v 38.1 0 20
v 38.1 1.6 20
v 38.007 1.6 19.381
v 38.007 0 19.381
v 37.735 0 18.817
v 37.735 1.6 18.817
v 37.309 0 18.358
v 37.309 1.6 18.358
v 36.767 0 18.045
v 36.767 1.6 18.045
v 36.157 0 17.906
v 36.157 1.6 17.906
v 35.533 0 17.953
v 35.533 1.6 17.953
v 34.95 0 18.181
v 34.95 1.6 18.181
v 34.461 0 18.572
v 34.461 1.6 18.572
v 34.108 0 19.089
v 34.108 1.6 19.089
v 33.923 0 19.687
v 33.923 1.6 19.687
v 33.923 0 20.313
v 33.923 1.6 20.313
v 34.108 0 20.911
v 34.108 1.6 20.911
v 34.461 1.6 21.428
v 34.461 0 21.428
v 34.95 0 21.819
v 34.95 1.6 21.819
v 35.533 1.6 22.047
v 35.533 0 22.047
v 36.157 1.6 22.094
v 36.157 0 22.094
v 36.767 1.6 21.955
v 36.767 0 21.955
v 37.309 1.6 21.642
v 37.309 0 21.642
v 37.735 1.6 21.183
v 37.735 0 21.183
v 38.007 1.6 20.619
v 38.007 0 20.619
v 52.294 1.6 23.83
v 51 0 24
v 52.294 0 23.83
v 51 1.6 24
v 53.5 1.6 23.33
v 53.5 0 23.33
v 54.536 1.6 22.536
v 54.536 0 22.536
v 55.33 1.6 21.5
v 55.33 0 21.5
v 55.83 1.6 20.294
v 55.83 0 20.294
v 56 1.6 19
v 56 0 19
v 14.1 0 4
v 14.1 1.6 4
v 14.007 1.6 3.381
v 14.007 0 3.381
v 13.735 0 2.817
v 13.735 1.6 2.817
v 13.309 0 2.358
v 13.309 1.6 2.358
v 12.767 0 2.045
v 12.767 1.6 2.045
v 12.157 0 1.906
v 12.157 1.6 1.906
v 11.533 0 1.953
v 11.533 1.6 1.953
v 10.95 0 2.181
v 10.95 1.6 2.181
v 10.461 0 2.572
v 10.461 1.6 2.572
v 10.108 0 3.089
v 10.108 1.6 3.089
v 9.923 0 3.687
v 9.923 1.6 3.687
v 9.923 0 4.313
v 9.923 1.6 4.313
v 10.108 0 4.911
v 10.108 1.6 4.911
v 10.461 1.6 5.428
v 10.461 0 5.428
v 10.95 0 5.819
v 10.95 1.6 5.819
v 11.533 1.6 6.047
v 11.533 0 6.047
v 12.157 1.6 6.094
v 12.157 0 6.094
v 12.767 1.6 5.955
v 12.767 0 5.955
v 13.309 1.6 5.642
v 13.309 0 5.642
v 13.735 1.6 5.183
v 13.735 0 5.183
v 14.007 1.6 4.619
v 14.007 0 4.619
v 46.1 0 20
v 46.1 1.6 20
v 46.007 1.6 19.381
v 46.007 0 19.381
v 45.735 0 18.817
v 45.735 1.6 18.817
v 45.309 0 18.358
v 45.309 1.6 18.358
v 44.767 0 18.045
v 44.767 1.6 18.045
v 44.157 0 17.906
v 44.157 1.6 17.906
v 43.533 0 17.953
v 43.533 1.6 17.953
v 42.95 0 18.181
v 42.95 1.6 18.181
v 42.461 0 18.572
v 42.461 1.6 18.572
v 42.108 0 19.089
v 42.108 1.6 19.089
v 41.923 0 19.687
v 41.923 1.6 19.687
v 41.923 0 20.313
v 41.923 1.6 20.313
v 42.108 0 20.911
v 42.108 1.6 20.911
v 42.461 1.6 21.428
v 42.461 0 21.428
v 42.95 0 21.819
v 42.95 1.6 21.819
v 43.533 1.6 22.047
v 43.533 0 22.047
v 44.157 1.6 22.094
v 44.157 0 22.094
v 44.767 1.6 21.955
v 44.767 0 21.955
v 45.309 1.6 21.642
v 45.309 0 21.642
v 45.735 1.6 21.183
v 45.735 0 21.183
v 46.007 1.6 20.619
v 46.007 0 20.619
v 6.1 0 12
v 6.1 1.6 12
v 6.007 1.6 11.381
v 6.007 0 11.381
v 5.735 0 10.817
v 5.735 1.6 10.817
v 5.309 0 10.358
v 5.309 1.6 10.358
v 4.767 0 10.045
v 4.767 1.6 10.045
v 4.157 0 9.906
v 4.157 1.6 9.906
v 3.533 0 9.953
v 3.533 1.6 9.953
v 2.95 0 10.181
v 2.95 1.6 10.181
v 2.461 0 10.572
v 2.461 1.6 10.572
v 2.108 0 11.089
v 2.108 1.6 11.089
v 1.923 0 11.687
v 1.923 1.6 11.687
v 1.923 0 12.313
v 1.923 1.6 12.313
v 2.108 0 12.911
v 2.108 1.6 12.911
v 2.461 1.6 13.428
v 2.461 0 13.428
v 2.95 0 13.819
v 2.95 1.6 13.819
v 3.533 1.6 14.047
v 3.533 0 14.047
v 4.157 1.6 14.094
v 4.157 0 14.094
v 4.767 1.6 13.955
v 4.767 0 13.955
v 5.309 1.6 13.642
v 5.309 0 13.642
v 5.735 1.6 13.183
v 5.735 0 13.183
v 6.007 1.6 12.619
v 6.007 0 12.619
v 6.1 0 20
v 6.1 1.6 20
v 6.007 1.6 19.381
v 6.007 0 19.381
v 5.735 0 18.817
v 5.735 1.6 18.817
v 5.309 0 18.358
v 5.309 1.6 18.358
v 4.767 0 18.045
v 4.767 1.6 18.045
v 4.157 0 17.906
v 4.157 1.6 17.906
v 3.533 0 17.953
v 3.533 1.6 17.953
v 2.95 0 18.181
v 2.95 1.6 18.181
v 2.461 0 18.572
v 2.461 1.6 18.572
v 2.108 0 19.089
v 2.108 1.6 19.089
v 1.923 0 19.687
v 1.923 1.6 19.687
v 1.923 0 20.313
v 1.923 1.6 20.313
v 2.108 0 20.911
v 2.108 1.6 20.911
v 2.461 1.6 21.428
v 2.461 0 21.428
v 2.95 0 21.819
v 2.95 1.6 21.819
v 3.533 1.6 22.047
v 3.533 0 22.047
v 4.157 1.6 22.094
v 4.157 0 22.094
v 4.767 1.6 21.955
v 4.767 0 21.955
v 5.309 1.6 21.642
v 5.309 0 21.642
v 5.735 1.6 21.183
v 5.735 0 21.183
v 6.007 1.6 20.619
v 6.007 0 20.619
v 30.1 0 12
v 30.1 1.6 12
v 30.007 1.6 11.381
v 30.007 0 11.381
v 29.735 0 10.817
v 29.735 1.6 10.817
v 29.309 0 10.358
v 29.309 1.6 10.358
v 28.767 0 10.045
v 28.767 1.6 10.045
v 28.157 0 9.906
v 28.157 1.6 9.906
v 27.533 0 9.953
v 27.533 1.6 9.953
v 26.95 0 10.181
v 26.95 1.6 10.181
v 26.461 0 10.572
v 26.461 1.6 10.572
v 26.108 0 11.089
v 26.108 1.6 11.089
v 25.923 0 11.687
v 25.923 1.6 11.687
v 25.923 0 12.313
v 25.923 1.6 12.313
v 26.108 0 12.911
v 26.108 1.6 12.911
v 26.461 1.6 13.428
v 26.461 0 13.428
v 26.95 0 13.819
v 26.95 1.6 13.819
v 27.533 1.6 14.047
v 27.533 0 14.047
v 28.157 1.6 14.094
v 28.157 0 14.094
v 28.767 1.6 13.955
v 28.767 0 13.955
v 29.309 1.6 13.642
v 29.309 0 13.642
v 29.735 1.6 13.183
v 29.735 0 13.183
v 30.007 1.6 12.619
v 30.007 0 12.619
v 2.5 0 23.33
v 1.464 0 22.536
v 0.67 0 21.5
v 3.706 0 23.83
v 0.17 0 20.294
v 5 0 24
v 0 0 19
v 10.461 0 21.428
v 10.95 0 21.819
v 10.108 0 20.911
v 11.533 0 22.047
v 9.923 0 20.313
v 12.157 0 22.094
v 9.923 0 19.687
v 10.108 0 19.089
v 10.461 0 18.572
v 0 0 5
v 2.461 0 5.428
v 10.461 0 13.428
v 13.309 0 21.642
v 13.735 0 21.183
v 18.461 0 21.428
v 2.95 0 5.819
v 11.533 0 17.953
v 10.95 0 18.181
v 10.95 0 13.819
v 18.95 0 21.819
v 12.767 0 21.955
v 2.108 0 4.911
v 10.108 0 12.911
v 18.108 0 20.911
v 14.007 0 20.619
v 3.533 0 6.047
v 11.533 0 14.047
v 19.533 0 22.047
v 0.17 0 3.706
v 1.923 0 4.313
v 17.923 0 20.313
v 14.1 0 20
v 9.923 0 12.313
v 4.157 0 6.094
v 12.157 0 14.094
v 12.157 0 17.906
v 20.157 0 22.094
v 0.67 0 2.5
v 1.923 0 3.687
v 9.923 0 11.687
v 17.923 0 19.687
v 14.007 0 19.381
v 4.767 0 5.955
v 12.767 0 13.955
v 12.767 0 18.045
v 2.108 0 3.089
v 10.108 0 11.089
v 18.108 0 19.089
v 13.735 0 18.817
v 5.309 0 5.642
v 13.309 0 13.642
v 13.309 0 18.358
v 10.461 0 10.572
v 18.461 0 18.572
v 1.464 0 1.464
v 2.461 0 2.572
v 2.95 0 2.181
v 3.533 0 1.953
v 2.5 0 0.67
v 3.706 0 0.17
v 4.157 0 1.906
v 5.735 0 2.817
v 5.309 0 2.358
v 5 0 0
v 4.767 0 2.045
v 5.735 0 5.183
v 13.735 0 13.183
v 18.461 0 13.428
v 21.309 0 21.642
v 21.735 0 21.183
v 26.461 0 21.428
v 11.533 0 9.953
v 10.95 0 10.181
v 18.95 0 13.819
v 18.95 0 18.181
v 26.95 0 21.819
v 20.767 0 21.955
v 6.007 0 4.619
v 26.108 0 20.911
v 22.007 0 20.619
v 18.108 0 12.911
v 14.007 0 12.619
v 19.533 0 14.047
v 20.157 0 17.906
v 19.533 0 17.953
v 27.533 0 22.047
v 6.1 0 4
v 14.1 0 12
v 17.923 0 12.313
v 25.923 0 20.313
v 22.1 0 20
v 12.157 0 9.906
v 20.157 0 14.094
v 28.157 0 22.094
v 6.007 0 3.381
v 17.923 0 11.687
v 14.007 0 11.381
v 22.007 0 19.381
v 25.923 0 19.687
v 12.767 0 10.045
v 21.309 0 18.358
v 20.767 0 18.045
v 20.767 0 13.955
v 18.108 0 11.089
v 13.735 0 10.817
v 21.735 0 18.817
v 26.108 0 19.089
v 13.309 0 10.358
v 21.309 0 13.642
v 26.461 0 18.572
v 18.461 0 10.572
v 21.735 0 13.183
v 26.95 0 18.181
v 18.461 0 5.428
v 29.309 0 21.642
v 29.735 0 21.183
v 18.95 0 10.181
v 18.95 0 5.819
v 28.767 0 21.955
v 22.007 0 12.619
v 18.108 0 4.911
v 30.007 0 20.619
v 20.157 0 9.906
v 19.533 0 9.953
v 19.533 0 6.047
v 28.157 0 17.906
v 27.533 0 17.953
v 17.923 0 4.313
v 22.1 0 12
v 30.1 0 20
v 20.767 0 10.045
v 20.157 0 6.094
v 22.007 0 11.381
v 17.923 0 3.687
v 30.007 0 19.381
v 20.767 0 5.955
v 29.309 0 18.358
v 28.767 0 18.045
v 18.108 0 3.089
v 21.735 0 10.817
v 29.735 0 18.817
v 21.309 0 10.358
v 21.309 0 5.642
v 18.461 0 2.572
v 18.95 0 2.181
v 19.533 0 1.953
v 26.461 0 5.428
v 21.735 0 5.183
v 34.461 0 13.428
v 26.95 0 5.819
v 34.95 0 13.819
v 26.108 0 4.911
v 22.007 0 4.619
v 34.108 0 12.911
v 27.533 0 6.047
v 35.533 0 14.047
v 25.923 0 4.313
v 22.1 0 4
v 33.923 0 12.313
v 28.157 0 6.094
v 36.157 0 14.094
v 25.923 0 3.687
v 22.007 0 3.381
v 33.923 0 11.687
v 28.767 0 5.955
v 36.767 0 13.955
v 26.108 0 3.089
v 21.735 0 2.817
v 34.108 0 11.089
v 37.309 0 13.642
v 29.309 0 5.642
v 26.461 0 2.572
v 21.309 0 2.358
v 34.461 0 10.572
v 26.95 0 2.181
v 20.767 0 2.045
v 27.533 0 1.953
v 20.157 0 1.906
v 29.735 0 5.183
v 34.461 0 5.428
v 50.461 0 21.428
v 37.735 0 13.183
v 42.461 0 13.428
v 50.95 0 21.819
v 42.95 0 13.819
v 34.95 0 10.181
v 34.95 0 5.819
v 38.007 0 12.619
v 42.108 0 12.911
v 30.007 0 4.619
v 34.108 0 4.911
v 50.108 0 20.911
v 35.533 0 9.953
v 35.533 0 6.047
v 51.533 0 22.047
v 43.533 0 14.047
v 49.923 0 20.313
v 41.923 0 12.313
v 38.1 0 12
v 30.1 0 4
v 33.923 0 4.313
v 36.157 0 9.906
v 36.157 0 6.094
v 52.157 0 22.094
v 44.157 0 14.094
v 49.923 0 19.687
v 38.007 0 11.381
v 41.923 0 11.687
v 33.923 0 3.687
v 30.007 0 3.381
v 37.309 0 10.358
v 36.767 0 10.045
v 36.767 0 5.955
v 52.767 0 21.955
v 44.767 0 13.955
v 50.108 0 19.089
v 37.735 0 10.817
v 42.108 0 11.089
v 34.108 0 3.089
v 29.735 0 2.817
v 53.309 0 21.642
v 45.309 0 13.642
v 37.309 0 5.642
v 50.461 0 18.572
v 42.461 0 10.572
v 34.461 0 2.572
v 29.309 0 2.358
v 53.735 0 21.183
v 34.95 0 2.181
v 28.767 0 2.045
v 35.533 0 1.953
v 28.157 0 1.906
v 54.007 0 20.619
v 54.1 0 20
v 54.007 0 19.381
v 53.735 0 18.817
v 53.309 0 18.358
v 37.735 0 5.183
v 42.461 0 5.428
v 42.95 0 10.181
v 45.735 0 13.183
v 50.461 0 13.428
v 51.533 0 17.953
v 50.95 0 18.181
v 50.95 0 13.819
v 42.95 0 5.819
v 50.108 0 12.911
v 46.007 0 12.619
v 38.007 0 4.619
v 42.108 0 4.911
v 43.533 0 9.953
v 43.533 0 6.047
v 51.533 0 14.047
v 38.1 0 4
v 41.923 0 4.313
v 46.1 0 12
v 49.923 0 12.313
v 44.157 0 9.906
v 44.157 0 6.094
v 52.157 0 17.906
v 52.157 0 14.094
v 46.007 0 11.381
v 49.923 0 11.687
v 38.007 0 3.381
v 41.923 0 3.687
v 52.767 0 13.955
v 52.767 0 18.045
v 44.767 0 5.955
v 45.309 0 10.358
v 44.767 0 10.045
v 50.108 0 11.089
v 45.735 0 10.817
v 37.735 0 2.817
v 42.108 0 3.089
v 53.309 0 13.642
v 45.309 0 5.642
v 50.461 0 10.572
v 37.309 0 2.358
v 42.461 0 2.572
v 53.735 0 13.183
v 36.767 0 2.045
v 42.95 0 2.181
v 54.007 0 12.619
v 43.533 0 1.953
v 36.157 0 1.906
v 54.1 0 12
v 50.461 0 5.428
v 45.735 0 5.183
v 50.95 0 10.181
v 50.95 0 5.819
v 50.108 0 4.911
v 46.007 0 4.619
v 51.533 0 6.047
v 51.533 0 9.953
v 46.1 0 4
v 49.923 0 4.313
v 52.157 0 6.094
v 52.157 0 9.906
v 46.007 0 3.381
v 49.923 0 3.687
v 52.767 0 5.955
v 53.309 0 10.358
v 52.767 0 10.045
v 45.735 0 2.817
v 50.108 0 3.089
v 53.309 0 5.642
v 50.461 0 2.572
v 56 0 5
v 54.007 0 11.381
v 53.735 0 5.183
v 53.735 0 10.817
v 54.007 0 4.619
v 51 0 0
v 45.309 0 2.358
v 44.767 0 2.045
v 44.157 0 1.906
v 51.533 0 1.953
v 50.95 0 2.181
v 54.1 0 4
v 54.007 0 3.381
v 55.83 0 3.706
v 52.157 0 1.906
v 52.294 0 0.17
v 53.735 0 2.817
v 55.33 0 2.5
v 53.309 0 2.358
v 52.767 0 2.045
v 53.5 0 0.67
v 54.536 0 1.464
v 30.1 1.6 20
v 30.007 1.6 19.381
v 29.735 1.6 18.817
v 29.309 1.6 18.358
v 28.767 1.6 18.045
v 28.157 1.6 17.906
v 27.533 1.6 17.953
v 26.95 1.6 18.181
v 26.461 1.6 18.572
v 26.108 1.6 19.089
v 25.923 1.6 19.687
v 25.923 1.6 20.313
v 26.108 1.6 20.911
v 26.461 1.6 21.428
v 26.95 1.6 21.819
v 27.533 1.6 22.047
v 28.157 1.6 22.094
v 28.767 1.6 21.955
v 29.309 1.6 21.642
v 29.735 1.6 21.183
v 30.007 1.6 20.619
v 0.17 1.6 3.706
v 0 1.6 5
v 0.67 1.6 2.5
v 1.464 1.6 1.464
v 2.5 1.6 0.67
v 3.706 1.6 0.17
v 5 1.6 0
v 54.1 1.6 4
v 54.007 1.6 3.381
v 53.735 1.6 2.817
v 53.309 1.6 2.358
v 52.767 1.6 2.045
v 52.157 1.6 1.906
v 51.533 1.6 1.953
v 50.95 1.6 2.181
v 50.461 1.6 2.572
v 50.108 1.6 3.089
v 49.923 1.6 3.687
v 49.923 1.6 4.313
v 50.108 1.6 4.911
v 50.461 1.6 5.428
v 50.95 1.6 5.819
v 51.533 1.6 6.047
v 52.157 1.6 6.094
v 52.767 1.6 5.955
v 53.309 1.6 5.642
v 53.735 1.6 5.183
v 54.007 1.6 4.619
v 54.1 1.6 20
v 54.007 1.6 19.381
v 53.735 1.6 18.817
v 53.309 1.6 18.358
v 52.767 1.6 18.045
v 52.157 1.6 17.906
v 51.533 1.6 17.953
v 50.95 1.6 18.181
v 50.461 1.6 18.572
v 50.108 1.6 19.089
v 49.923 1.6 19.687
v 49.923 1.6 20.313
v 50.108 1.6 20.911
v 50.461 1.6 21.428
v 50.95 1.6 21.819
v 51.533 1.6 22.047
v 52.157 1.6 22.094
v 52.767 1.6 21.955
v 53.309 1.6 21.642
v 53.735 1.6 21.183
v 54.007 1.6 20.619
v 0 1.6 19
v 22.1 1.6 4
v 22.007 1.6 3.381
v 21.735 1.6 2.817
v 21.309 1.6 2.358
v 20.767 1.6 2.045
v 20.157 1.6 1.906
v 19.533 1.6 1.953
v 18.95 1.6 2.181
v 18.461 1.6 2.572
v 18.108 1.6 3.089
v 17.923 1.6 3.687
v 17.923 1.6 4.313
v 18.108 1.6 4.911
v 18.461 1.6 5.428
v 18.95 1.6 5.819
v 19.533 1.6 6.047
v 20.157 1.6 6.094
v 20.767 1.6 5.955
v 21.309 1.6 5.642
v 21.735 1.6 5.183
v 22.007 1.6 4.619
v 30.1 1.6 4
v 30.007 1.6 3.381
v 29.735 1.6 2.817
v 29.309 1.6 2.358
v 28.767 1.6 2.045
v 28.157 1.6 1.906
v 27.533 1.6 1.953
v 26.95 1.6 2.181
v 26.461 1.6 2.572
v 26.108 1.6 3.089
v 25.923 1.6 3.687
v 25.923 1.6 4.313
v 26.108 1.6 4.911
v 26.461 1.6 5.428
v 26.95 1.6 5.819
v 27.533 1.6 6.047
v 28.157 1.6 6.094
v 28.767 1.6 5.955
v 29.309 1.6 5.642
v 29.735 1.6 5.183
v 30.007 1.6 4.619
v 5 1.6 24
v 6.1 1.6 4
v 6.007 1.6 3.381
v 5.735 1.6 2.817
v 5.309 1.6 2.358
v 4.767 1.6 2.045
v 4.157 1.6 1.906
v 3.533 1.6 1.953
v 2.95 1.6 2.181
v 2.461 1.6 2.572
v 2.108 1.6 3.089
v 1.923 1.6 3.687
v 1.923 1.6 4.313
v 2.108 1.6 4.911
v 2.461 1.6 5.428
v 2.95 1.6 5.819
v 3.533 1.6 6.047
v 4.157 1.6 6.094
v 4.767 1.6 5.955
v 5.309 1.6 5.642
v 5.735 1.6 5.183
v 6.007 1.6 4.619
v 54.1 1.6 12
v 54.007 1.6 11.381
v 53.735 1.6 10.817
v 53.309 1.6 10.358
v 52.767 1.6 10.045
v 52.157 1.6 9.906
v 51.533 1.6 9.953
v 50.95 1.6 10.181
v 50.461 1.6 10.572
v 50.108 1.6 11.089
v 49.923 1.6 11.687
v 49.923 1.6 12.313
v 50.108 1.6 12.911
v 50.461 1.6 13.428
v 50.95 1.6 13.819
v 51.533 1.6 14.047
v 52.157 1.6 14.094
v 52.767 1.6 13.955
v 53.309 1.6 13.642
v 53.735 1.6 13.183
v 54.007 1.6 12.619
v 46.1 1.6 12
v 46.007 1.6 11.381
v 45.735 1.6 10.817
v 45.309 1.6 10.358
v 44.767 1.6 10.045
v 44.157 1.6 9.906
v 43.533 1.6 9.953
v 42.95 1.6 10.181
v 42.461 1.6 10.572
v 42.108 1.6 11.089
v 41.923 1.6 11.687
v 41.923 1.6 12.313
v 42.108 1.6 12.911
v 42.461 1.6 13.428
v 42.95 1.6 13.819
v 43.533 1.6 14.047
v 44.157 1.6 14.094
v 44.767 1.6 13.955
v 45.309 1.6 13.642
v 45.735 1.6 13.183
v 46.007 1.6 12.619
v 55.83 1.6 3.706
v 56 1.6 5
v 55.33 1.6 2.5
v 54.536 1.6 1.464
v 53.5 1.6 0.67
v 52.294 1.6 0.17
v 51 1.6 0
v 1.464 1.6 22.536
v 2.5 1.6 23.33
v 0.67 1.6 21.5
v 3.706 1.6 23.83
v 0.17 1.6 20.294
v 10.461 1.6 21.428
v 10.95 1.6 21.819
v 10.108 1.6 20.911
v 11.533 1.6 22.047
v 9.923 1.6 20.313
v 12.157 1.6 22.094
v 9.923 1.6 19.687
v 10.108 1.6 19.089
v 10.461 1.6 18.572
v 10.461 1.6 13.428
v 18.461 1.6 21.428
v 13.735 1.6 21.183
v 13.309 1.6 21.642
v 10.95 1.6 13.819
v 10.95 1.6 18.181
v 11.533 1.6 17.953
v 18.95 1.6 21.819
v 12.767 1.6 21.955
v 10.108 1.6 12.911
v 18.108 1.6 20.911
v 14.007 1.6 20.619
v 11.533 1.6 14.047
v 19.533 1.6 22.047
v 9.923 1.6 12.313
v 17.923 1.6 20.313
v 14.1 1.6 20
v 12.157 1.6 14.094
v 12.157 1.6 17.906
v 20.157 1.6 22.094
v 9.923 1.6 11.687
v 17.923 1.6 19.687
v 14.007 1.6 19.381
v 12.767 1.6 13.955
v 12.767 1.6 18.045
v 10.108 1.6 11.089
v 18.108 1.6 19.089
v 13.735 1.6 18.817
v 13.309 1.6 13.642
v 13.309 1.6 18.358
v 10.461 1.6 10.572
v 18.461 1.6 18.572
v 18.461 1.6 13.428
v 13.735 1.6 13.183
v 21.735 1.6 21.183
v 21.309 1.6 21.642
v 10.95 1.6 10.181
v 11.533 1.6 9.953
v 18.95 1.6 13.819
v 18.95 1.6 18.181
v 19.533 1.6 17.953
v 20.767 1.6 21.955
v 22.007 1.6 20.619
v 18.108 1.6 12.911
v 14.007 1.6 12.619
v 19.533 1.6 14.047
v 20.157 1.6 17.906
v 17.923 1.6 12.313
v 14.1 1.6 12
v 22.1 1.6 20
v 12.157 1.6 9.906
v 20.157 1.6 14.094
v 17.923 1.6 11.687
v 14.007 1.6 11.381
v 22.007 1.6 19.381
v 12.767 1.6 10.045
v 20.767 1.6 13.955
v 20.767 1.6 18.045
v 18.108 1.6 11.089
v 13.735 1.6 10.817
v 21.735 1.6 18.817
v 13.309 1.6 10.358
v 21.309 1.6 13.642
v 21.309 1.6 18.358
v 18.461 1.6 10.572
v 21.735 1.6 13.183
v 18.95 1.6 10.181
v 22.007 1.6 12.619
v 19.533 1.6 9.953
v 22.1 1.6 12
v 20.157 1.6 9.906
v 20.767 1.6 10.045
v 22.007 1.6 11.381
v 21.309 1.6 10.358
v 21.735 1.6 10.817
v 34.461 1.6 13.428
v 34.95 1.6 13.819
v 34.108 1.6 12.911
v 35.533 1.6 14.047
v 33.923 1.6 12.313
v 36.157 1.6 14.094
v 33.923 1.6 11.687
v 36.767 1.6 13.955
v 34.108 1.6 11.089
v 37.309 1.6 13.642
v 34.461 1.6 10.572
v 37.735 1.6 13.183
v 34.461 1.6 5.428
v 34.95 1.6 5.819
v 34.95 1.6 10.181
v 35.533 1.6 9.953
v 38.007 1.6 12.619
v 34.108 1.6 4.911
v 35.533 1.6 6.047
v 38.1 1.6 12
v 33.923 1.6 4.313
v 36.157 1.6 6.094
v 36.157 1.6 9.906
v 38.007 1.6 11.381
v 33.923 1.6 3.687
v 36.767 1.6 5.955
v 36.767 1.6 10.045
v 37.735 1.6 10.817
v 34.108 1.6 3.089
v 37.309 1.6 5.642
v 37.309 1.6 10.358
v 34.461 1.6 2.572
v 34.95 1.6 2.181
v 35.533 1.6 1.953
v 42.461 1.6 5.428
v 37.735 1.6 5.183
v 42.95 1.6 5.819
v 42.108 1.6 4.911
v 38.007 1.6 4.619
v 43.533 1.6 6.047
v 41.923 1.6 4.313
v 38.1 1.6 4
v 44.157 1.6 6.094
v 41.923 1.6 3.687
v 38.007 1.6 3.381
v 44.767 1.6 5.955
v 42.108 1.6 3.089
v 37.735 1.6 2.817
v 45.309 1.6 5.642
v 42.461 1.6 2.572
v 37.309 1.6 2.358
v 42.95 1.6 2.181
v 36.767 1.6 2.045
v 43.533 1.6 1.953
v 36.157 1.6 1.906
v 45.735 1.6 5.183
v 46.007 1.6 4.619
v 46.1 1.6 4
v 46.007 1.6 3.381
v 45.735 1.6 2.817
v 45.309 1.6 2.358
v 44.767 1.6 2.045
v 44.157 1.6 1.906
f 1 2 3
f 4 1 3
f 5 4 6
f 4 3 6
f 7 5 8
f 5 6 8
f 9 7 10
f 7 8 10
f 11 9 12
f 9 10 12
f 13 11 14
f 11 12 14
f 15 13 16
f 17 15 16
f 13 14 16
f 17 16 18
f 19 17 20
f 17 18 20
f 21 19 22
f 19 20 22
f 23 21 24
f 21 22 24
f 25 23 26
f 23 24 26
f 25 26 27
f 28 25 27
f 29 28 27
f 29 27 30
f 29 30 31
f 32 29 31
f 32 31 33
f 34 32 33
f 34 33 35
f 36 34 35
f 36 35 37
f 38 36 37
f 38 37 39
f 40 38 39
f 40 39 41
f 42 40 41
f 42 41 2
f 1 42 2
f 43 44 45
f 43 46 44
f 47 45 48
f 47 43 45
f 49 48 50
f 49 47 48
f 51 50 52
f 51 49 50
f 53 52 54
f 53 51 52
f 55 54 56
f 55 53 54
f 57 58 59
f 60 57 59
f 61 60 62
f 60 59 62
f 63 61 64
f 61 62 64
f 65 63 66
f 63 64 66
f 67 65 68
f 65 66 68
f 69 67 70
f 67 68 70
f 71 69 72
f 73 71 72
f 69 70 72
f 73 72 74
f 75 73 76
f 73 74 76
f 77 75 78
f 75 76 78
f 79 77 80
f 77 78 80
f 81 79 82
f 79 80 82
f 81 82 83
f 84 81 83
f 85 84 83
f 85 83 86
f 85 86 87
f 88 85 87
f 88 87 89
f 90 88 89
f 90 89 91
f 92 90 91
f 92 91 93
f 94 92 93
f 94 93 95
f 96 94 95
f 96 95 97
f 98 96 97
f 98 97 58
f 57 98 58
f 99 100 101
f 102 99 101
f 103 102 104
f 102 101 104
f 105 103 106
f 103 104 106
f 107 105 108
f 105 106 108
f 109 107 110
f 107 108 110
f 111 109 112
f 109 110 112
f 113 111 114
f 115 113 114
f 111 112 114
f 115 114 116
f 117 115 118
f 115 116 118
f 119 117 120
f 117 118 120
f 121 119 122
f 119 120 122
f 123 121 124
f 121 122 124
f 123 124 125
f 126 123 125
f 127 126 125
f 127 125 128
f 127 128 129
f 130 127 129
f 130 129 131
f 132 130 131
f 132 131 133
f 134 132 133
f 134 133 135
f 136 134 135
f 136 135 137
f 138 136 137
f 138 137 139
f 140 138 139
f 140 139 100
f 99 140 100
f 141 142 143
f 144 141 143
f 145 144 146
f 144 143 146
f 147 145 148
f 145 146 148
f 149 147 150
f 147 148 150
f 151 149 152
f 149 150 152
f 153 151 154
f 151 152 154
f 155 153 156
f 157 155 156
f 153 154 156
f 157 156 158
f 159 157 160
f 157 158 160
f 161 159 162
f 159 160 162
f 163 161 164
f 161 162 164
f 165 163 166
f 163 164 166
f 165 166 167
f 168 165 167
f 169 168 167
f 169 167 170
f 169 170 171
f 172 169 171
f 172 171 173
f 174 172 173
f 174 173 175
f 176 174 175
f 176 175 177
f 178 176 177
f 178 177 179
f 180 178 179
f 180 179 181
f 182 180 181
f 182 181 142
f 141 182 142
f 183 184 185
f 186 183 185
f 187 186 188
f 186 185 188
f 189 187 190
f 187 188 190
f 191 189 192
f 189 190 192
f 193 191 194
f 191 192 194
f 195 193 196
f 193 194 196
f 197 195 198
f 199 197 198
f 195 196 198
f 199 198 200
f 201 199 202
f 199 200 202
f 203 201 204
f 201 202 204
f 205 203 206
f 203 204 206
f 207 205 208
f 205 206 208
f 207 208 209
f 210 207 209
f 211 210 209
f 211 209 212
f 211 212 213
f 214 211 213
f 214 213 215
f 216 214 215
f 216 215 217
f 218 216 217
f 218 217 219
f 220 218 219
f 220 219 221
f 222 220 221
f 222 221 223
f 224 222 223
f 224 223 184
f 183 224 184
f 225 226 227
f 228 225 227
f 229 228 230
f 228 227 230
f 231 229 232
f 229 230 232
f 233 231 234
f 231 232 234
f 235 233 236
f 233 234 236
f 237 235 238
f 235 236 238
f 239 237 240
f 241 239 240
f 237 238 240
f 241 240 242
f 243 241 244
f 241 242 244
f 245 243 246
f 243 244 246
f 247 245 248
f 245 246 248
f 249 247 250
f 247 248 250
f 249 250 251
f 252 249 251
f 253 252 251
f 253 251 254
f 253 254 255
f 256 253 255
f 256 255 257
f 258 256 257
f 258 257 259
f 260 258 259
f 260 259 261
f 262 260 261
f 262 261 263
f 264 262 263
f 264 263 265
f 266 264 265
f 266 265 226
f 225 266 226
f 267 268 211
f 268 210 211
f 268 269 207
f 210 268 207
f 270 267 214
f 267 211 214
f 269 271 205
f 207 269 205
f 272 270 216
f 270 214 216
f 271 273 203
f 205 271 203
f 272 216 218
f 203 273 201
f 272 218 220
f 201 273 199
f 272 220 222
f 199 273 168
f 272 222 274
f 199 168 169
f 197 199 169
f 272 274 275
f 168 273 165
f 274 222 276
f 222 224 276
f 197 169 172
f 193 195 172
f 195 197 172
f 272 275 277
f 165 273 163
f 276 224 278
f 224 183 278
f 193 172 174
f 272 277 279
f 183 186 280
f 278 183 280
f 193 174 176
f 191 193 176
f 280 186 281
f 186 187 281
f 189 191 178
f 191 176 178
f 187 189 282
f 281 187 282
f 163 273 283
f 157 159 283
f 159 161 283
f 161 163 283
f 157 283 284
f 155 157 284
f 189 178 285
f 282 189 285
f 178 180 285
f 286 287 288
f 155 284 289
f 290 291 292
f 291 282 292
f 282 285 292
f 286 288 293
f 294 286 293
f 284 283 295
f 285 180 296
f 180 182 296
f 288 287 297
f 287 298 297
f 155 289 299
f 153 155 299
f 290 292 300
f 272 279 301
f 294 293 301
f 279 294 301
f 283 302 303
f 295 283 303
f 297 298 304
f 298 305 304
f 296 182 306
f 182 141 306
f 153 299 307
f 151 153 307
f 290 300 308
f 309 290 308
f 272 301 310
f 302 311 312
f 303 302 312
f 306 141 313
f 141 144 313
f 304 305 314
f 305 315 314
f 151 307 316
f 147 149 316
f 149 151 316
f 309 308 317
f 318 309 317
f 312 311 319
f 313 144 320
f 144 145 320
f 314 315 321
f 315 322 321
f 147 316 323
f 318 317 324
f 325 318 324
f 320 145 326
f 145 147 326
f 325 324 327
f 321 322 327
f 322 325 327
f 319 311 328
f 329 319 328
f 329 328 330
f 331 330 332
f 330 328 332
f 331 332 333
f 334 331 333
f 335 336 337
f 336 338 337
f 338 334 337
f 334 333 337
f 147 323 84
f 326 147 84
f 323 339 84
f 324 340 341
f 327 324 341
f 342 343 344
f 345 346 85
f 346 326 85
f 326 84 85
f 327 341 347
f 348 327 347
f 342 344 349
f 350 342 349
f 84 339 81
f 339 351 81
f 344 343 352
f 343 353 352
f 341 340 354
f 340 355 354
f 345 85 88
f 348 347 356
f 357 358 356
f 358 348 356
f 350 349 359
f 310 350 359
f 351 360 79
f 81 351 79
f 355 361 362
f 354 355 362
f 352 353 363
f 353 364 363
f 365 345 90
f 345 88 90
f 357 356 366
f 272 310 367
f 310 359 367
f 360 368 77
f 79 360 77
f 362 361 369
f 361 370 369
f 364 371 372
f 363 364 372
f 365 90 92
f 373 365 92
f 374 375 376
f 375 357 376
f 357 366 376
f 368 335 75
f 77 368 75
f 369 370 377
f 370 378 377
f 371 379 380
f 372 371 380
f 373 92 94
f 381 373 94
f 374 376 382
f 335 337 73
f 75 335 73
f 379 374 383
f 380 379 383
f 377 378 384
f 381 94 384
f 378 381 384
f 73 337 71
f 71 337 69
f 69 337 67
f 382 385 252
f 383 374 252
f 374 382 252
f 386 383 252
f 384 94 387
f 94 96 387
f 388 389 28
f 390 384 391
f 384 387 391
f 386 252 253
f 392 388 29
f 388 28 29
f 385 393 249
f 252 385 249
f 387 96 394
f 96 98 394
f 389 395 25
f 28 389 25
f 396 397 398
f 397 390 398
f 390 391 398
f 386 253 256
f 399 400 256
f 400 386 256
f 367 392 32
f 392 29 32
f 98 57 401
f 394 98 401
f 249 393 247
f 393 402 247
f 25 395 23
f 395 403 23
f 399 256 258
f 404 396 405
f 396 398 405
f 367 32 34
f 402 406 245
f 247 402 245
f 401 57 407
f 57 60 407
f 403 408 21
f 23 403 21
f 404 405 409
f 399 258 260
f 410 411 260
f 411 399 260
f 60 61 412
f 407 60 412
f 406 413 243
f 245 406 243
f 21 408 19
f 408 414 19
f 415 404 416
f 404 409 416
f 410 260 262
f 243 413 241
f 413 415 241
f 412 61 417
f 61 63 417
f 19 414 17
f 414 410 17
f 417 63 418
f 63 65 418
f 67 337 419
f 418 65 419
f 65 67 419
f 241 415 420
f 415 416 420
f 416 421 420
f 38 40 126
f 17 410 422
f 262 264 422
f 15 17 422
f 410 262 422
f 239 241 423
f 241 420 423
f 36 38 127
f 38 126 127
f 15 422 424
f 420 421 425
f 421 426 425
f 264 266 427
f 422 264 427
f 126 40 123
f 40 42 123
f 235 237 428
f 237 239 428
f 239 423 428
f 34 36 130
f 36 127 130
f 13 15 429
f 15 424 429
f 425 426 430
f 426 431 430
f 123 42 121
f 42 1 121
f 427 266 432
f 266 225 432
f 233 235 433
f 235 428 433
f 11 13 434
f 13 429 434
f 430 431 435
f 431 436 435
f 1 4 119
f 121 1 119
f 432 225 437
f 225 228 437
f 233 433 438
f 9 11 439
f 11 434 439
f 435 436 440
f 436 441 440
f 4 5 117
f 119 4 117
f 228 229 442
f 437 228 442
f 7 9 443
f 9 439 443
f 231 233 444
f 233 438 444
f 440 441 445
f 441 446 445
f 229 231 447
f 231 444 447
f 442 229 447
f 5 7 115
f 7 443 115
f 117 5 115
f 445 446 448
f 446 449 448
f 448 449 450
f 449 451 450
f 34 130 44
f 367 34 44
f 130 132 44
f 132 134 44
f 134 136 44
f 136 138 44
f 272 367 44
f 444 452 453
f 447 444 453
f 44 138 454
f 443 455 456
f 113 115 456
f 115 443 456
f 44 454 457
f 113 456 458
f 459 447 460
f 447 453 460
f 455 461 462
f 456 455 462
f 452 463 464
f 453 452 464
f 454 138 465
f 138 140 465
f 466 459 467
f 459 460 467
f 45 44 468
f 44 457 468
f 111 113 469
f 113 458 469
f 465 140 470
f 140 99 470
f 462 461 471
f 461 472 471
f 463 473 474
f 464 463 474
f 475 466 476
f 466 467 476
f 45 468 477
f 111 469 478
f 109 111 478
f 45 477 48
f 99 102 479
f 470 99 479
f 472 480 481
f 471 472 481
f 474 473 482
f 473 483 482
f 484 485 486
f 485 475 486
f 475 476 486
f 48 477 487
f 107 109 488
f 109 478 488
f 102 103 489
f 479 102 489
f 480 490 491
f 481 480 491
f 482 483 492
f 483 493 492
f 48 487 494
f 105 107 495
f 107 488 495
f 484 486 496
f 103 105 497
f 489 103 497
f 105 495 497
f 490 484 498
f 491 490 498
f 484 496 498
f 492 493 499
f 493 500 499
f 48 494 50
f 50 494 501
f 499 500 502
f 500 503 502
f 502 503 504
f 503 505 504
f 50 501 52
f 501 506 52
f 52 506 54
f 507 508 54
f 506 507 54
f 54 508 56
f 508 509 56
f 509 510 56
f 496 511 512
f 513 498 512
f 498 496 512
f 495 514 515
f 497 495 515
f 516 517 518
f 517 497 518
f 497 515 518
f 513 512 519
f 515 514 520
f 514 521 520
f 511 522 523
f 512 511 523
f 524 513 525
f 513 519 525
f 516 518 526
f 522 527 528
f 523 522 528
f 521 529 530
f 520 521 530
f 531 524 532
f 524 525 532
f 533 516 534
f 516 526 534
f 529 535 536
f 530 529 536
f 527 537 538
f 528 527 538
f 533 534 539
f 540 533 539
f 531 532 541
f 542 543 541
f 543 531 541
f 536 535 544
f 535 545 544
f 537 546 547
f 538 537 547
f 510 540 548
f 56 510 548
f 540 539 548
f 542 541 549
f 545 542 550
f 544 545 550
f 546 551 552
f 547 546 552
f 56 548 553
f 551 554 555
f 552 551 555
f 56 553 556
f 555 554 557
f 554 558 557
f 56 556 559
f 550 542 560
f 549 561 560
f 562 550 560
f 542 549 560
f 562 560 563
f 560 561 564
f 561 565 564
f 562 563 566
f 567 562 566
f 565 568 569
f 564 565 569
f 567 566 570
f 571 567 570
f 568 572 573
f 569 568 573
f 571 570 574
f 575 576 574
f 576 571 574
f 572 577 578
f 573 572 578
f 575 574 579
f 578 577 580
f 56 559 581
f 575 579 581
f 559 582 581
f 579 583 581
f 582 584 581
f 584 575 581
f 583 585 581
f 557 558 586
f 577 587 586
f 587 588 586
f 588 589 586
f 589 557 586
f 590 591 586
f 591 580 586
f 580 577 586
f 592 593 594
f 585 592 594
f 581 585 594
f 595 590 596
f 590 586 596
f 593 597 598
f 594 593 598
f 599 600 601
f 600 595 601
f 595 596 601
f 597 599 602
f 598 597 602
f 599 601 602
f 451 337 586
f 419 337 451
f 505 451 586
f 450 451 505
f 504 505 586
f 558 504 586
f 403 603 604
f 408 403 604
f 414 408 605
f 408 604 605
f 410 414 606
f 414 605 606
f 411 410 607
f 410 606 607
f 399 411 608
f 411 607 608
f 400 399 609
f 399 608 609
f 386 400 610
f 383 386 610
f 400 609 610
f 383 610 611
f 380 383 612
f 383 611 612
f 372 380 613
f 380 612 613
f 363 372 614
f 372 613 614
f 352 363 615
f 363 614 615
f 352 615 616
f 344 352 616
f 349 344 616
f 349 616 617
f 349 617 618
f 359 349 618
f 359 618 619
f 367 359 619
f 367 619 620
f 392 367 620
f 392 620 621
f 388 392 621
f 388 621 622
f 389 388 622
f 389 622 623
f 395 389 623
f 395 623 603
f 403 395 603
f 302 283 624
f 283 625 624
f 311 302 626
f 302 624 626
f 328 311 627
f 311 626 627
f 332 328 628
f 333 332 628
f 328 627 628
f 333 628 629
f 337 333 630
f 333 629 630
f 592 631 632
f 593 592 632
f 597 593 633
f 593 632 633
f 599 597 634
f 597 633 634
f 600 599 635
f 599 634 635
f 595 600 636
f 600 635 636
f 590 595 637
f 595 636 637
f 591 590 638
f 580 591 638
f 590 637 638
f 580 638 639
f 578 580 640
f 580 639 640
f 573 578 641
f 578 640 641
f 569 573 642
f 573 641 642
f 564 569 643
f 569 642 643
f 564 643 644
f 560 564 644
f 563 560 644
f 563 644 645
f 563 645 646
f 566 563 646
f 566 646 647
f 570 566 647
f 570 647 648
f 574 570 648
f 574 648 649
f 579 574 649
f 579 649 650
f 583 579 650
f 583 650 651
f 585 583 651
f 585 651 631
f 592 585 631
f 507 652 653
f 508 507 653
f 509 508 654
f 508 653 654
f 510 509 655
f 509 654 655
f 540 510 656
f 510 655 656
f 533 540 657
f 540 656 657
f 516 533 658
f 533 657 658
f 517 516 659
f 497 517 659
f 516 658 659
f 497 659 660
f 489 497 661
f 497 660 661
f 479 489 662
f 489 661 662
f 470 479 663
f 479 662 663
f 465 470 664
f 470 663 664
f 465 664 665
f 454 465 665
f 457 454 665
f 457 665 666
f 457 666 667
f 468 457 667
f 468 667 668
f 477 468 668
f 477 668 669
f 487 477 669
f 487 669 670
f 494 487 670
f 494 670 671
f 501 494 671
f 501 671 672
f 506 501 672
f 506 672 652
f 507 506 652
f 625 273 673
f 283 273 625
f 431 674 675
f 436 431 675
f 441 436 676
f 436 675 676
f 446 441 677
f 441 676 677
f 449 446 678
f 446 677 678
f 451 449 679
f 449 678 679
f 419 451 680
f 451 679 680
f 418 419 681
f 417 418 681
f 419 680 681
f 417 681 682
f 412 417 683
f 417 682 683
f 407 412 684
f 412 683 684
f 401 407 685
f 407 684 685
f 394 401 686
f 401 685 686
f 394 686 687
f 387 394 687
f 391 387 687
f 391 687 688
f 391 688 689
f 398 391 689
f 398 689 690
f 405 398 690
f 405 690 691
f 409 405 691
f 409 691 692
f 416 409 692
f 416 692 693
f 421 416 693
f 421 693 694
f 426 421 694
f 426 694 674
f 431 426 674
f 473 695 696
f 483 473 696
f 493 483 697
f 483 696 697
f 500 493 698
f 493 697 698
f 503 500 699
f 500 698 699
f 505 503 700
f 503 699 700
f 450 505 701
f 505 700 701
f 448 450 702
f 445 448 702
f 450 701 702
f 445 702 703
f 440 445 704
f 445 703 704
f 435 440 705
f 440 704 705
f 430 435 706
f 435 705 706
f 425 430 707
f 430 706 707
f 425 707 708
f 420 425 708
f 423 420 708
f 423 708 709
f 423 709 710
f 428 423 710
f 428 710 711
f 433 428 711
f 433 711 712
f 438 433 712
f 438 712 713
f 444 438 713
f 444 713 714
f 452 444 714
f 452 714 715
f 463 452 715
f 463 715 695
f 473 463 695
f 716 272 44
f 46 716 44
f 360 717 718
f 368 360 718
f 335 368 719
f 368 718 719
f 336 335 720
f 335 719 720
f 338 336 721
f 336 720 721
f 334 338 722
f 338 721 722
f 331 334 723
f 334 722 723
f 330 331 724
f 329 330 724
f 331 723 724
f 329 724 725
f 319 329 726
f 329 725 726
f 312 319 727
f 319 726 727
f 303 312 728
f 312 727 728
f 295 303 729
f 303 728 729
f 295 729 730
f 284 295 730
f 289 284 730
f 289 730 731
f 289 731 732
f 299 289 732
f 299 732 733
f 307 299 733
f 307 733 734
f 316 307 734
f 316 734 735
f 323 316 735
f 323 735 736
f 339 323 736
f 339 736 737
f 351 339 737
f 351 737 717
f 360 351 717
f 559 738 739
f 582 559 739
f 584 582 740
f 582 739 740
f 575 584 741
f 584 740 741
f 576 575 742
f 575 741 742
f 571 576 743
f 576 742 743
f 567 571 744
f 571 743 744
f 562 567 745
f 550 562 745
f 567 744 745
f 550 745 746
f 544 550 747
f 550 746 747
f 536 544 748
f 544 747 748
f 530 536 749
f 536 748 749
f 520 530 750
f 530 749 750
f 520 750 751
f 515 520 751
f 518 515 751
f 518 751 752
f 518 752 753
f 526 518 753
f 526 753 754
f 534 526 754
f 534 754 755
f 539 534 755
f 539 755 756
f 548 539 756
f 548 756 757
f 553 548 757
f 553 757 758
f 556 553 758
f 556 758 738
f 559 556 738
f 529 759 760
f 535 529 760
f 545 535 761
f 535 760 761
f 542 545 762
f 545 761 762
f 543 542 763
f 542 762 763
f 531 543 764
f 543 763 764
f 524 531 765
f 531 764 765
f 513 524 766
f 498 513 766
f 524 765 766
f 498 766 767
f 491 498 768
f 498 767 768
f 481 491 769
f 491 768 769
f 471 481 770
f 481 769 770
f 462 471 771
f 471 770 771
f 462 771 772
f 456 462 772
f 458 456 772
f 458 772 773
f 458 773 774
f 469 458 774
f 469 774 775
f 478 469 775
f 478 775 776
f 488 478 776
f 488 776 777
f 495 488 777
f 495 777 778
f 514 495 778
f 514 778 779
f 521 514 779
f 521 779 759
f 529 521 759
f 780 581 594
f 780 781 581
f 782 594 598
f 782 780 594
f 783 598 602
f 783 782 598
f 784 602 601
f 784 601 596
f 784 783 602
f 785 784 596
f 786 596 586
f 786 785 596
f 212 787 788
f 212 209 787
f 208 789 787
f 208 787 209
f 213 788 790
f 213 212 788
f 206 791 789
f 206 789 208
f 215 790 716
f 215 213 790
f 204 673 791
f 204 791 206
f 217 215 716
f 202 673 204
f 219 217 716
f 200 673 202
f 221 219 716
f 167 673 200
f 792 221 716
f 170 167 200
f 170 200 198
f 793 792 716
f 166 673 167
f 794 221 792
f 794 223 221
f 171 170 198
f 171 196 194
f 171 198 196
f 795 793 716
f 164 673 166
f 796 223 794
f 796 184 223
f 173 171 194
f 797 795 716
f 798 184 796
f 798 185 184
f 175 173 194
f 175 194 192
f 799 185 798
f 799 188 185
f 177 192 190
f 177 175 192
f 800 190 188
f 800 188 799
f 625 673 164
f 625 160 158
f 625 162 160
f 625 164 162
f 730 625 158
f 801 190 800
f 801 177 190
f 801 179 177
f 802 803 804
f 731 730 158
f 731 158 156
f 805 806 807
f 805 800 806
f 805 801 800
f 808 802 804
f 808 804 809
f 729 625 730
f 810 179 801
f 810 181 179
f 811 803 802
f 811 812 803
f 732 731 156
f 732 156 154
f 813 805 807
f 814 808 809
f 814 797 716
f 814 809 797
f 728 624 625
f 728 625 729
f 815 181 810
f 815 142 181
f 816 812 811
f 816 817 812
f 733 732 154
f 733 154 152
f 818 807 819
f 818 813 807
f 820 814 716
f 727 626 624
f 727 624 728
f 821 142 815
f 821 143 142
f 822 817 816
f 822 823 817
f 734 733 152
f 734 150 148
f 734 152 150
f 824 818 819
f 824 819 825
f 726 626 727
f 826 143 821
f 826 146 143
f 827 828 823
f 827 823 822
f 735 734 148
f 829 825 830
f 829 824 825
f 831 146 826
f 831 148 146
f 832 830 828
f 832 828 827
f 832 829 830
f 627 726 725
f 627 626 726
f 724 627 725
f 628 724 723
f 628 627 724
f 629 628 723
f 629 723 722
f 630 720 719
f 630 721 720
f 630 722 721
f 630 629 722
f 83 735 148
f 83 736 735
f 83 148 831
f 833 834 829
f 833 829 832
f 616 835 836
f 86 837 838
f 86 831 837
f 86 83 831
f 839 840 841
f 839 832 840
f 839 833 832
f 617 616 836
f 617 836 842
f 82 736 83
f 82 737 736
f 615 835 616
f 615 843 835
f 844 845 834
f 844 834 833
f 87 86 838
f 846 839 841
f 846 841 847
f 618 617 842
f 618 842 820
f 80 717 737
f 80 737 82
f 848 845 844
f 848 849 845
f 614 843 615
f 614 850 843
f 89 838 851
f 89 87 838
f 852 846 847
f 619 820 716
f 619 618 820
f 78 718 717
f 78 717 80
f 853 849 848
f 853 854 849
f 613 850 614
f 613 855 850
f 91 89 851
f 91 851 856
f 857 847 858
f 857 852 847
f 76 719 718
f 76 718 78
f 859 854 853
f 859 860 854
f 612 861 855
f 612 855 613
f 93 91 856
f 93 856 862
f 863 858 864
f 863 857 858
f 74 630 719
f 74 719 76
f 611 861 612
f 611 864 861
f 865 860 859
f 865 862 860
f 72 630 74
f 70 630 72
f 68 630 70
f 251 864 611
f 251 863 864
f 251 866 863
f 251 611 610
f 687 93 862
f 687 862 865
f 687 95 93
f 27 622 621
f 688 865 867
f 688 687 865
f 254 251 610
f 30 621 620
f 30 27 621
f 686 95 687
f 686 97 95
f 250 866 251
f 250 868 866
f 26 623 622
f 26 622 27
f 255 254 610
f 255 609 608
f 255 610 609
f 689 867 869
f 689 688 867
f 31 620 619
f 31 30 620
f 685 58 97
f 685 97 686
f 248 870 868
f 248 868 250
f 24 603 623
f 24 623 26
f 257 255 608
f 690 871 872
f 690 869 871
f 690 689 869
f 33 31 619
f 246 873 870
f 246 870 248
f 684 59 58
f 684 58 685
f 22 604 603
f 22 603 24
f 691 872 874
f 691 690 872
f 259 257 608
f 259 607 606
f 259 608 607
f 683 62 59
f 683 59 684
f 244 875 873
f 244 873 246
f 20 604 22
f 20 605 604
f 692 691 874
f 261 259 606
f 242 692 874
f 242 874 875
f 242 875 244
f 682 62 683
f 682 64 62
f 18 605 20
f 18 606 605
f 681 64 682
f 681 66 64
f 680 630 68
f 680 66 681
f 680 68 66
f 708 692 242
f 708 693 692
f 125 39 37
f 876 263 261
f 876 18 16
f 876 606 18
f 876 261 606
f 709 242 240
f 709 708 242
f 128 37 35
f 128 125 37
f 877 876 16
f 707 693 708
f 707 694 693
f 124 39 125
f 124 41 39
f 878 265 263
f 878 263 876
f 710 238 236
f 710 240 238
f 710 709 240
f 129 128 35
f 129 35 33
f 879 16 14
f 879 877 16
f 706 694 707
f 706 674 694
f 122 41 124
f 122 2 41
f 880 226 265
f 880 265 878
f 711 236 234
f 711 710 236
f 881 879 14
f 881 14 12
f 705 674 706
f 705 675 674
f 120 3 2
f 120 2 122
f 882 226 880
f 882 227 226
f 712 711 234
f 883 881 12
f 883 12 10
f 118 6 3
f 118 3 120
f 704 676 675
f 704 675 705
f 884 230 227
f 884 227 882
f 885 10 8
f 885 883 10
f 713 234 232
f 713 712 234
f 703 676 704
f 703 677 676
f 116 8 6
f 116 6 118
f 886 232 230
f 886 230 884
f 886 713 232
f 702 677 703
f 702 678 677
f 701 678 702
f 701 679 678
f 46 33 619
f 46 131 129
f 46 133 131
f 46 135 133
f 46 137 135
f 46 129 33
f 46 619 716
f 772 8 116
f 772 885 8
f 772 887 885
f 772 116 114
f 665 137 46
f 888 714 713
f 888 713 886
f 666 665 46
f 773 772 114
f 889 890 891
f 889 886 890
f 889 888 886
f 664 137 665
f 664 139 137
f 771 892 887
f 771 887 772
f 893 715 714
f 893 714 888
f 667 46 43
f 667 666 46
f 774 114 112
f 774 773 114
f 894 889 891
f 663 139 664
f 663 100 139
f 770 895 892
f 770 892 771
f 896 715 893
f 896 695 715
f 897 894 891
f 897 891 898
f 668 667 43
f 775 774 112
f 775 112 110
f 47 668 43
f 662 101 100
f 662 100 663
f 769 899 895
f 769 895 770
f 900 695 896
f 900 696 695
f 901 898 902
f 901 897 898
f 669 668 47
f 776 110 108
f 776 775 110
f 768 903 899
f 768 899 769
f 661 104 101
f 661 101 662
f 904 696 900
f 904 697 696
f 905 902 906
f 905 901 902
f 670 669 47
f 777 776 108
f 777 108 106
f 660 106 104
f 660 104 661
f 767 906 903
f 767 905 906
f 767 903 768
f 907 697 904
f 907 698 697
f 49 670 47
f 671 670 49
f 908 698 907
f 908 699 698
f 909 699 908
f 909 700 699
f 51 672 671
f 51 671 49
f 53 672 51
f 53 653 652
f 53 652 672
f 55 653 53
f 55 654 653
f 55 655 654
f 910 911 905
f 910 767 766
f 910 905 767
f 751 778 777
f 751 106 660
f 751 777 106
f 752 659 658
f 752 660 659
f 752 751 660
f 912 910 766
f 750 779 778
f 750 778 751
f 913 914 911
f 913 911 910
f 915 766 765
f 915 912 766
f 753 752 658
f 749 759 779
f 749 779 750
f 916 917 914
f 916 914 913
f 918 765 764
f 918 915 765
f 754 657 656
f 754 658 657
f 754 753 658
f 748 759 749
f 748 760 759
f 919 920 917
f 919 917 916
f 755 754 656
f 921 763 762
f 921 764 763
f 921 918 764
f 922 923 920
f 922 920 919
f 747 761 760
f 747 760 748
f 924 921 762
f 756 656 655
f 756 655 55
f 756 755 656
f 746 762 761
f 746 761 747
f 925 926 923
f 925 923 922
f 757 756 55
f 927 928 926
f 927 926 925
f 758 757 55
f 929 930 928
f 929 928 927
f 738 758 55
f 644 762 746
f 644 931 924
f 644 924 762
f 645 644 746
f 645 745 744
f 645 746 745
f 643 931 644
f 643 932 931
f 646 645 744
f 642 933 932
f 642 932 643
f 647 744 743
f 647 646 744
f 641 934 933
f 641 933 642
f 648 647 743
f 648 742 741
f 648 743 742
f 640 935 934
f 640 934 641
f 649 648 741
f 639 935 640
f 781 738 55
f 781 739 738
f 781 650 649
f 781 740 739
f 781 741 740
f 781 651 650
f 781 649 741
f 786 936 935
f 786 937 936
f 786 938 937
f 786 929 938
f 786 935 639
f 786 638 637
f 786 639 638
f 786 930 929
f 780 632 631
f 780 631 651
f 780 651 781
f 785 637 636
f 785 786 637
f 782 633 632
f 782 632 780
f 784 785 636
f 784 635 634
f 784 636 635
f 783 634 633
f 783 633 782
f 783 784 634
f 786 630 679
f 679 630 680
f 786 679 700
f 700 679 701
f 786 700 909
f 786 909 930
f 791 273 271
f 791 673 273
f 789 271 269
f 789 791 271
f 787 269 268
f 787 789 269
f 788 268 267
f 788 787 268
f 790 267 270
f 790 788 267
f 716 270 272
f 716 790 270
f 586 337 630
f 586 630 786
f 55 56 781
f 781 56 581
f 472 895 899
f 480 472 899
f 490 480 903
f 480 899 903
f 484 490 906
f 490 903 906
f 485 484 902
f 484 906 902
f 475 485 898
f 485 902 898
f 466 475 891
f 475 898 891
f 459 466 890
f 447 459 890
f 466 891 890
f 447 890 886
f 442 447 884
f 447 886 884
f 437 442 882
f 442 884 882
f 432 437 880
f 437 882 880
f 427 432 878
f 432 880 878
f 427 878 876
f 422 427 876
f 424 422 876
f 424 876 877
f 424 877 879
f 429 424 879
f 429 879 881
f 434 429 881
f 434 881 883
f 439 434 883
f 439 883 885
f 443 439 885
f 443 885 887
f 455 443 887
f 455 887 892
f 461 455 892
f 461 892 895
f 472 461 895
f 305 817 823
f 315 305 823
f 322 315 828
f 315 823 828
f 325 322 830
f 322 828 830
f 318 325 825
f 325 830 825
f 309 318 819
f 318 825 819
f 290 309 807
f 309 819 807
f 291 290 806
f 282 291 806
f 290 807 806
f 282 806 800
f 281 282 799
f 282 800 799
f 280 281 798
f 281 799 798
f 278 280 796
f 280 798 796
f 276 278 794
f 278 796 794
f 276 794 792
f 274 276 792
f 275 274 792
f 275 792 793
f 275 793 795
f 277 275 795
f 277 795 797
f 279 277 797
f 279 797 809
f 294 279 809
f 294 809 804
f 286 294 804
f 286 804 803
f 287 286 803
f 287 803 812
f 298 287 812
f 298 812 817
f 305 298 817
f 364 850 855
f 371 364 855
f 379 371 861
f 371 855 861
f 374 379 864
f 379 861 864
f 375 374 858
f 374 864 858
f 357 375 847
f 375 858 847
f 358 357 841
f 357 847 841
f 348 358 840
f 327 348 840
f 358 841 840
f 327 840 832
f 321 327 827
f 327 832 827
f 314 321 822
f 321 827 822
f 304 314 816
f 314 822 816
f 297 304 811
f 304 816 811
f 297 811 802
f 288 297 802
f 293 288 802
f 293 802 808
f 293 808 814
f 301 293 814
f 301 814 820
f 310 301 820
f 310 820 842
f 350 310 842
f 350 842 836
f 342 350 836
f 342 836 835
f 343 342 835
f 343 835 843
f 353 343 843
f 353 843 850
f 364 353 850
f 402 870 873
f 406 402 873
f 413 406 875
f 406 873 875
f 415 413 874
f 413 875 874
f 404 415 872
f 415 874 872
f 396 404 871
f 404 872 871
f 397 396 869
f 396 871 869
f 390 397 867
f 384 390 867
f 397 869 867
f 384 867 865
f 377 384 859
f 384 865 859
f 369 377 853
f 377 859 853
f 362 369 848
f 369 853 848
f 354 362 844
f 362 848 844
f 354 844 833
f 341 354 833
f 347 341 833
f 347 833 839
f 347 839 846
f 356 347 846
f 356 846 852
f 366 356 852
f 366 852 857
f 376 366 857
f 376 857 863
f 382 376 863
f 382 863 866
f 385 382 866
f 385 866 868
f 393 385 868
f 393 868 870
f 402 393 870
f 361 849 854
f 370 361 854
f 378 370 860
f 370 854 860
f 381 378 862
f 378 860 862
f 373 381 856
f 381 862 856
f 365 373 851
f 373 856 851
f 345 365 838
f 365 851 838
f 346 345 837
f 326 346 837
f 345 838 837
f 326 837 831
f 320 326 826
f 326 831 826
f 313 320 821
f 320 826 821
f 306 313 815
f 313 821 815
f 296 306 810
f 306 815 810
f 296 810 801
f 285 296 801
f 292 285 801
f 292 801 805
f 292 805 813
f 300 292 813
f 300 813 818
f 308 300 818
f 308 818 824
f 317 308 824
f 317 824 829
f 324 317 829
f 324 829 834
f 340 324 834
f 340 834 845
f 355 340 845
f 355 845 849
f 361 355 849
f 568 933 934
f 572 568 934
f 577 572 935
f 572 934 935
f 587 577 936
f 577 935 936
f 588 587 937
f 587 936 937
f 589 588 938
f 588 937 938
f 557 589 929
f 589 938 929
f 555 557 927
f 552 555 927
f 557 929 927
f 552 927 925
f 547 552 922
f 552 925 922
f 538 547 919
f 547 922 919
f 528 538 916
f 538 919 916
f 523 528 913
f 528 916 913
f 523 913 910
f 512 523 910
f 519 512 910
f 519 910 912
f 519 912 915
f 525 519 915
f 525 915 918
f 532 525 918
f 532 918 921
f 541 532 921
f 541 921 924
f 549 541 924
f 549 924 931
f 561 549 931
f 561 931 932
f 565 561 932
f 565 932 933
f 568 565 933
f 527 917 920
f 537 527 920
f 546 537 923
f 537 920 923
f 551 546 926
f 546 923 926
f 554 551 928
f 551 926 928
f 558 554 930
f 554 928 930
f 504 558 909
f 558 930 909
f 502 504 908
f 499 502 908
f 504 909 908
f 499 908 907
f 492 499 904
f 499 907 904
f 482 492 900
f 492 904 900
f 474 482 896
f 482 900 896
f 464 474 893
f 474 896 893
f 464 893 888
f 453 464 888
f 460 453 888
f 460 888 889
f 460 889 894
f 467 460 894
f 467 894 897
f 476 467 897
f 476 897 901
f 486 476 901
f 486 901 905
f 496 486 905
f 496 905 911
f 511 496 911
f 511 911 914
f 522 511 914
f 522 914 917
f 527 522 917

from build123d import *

# Parameters (mm, degrees)
SKETCH1_W            = 56
SKETCH1_H            = 24
BOSS_EXTRUDE1_DEPTH  = 1.6
FILLET1_R            = 5
SKETCH2_R            = 2.1
CUT_EXTRUDE1_DEPTH   = 2.6
LPATTERN1_COUNT      = 7
LPATTERN1_PITCH      = 8
LPATTERN1_COUNT_DIR2 = 3
LPATTERN1_PITCH_DIR2 = 8


with BuildPart() as part:
    # Sketch1 → Boss-Extrude1 (new body)
    with BuildSketch(Plane(origin=(0, 0, 0), x_dir=(1, 0, 0), z_dir=(0, 1, 0))):
        with Locations((28, -12)):
            Rectangle(SKETCH1_W, SKETCH1_H)
    extrude(amount=BOSS_EXTRUDE1_DEPTH)

    # Fillet1
    fillet1_edges = [part.edges().sort_by_distance(p)[0] for p in [
        (0, 0.8, 0),
        (56, 0.8, 0),
        (56, 0.8, 24),
        (0, 0.8, 24),
    ]]
    fillet(fillet1_edges, radius=FILLET1_R)

    # Sketch2 → Cut-Extrude1 (cut, through all)
    with BuildSketch(Plane(origin=(0, 1.6, 0), x_dir=(1, 0, 0), z_dir=(0, 1, 0))):
        with Locations((4, -4)):
            Circle(SKETCH2_R)
    cut_extrude1 = extrude(amount=-CUT_EXTRUDE1_DEPTH, mode=Mode.SUBTRACT)

    # LPattern1: Cut-Extrude1 7 × 3
    with Locations(*[(i * LPATTERN1_PITCH, 0, j * LPATTERN1_PITCH_DIR2) for i in range(LPATTERN1_COUNT) for j in range(LPATTERN1_COUNT_DIR2) if (i, j) != (0, 0)]):
        add(cut_extrude1, mode=Mode.SUBTRACT)


solid = part.part
